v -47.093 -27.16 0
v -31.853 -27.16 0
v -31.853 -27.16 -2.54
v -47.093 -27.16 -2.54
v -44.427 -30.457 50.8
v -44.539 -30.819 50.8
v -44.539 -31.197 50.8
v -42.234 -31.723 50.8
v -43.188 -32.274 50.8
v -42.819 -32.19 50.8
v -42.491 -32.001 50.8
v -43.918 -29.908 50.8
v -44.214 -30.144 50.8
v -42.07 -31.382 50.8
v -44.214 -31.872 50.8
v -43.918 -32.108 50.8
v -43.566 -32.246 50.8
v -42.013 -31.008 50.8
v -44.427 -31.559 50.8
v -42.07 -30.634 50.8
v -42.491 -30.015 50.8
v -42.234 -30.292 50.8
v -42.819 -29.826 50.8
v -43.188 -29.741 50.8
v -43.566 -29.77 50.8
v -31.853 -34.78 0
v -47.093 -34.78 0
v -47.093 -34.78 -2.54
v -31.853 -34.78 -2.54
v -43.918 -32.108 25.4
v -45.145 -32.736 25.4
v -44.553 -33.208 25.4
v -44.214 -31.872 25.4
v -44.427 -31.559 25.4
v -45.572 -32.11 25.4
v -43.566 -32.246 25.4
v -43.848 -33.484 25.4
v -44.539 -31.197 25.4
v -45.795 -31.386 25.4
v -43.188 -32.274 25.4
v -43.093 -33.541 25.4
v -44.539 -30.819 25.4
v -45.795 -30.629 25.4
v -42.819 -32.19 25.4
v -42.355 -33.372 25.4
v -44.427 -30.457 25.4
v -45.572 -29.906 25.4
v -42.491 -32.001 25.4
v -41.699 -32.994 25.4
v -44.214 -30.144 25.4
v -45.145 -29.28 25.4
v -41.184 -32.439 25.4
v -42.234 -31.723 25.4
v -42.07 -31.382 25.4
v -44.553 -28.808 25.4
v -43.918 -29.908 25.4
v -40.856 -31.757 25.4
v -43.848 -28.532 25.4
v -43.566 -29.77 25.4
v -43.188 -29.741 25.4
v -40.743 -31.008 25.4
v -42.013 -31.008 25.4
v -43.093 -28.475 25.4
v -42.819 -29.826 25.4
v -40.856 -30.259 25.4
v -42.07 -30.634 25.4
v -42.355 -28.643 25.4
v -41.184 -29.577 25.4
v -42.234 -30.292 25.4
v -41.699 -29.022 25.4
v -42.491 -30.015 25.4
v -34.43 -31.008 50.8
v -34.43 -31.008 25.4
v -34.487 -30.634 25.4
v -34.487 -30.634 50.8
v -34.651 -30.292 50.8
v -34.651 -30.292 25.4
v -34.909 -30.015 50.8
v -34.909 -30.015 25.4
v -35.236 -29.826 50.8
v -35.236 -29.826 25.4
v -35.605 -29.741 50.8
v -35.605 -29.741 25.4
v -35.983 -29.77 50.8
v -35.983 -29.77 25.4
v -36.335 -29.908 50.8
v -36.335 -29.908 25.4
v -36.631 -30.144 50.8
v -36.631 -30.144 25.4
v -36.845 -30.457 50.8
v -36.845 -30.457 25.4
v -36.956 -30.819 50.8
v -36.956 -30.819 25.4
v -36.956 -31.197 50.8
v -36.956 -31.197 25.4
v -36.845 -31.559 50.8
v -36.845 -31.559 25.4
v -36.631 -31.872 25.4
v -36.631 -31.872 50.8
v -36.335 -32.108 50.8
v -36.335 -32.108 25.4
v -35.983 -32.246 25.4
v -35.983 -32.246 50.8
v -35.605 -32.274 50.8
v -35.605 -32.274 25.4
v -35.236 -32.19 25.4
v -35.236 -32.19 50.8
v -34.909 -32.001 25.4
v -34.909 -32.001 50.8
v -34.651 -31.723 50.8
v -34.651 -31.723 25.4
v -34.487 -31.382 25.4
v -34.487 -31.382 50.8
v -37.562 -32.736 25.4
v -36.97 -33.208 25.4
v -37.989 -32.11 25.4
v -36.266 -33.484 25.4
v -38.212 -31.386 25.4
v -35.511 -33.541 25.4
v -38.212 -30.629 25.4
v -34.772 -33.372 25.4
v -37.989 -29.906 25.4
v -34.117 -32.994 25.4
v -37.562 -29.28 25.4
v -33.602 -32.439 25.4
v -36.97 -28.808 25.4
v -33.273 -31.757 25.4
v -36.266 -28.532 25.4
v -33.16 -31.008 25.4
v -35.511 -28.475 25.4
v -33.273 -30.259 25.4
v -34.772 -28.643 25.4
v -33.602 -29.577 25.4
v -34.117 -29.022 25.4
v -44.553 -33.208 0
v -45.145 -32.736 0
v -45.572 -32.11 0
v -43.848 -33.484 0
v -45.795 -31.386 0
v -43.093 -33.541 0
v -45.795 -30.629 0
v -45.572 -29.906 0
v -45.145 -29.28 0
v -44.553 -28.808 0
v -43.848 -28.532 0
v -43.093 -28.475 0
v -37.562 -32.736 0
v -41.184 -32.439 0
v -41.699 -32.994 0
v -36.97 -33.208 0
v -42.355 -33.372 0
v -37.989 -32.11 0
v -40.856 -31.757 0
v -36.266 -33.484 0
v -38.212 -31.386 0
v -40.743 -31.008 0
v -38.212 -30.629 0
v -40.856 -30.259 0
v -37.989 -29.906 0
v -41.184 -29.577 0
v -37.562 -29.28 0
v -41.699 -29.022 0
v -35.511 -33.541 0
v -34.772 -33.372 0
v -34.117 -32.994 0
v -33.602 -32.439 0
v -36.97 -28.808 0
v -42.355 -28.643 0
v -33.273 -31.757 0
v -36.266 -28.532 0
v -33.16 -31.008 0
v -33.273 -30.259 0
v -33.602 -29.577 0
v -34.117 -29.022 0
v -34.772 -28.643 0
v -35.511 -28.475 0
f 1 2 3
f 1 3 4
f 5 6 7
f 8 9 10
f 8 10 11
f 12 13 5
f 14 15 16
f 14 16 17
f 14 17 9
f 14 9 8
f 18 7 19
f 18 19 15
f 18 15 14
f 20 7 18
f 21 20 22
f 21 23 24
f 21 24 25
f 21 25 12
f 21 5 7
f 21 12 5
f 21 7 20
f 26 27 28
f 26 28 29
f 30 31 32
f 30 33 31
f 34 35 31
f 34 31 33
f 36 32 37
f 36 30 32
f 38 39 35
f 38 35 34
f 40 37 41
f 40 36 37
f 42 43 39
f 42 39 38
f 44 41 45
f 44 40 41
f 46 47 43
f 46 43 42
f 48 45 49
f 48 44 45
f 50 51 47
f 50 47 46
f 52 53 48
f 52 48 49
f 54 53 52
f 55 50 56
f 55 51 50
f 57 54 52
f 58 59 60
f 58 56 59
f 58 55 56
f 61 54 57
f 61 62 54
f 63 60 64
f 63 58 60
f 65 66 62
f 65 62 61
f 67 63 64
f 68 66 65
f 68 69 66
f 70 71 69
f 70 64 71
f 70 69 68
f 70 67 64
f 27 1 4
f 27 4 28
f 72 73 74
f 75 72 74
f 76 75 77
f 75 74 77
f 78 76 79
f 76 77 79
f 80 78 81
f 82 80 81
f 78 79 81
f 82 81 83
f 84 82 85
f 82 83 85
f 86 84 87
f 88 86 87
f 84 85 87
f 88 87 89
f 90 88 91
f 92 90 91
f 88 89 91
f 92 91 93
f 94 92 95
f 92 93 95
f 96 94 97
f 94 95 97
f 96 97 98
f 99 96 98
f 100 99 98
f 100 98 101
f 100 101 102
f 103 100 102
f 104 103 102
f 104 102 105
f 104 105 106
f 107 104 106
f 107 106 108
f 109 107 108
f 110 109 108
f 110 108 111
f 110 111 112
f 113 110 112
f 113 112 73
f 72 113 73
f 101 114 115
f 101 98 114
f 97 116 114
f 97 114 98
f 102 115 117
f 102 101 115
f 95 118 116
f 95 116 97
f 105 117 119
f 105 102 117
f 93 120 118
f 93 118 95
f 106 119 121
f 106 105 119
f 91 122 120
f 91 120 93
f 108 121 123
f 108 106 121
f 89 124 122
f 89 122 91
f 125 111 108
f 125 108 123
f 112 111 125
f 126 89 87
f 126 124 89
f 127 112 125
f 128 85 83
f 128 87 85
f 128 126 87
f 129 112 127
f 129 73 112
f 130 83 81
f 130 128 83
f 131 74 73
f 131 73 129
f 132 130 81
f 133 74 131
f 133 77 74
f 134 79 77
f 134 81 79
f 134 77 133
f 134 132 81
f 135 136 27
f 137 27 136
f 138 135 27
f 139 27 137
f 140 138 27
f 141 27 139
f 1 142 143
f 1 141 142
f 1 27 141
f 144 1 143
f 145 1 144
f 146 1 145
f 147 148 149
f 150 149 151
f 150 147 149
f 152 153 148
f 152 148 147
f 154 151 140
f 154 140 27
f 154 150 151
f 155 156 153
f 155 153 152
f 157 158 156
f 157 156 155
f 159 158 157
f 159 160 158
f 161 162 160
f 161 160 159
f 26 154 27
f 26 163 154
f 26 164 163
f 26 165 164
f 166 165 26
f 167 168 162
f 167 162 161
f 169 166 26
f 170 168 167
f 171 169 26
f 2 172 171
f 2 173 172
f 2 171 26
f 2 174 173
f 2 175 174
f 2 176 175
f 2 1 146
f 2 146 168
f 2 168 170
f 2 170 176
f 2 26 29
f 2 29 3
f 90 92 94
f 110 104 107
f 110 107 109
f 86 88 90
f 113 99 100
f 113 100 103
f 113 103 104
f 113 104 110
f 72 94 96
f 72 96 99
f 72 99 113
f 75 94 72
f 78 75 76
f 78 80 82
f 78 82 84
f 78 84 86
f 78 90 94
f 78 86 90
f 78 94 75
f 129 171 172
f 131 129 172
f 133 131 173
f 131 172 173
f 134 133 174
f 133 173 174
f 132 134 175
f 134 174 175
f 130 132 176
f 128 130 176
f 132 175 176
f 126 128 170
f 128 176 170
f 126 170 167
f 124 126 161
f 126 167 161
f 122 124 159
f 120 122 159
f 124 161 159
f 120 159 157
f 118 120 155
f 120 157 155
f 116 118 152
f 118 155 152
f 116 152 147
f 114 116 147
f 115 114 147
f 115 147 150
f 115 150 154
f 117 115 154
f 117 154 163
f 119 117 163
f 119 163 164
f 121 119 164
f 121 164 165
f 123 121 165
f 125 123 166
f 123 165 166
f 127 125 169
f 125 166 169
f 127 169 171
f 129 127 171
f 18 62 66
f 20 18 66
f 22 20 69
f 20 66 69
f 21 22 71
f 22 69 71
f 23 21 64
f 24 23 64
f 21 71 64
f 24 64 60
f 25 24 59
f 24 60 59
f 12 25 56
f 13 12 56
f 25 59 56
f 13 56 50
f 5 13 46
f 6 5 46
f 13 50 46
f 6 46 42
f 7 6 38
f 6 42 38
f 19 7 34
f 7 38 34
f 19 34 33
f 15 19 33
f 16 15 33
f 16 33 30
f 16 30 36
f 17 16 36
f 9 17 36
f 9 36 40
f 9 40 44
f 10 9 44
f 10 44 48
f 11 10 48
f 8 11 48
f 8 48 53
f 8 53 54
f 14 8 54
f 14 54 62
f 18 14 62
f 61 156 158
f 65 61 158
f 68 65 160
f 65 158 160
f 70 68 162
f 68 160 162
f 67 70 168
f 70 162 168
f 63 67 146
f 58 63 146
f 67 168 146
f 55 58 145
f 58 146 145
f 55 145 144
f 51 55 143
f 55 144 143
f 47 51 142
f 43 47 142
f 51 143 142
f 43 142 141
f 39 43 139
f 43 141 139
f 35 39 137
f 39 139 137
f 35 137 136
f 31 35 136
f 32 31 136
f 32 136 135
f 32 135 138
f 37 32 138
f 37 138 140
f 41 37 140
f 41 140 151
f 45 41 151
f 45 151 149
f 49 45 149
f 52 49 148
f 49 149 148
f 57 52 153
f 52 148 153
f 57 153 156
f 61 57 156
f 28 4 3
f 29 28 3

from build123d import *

# Parameters (mm, degrees)
F0_R     = 2.54
F0_R_2   = 1.27
F1_DEPTH = 2.54
F2_DEPTH = 25.4
F3_DEPTH = 50.8


with BuildPart() as f1:
    # F0 (on Top) → F1 (new body)
    with BuildSketch(Plane.XY):
        Polygon((-47.093086, -27.160453), (-47.093086, -34.780453), (-39.473086, -34.780453), (-31.853086, -34.780453), (-31.853086, -27.160453), (-39.473086, -27.160453), align=None)
        with Locations((-43.283086, -31.007911)):
            Circle(F0_R, mode=Mode.SUBTRACT)
        with Locations((-35.700362, -31.007911)):
            Circle(F0_R, mode=Mode.SUBTRACT)
        with Locations((-43.283086, -31.007911)):
            Circle(F0_R)
        with Locations((-43.283086, -31.007911)):
            Circle(F0_R_2, mode=Mode.SUBTRACT)
        with Locations((-43.283086, -31.007911)):
            Circle(F0_R_2)
        with Locations((-35.700362, -31.007911)):
            Circle(F0_R)
        with Locations((-35.700362, -31.007911)):
            Circle(F0_R_2, mode=Mode.SUBTRACT)
        with Locations((-35.700362, -31.007911)):
            Circle(F0_R_2)
    extrude(amount=-F1_DEPTH)

    # F0 (on Top) → F2 (join)
    with BuildSketch(Plane.XY):
        with Locations((-43.283086, -31.007911)):
            Circle(F0_R)
        with Locations((-43.283086, -31.007911)):
            Circle(F0_R_2, mode=Mode.SUBTRACT)
        with Locations((-35.700362, -31.007911)):
            Circle(F0_R)
        with Locations((-35.700362, -31.007911)):
            Circle(F0_R_2, mode=Mode.SUBTRACT)
    extrude(amount=F2_DEPTH)

    # F0 (on Top) → F3 (join)
    with BuildSketch(Plane.XY):
        with Locations((-43.283086, -31.007911)):
            Circle(F0_R_2)
        with Locations((-35.700362, -31.007911)):
            Circle(F0_R_2)
    extrude(amount=F3_DEPTH)


solid = f1.part
